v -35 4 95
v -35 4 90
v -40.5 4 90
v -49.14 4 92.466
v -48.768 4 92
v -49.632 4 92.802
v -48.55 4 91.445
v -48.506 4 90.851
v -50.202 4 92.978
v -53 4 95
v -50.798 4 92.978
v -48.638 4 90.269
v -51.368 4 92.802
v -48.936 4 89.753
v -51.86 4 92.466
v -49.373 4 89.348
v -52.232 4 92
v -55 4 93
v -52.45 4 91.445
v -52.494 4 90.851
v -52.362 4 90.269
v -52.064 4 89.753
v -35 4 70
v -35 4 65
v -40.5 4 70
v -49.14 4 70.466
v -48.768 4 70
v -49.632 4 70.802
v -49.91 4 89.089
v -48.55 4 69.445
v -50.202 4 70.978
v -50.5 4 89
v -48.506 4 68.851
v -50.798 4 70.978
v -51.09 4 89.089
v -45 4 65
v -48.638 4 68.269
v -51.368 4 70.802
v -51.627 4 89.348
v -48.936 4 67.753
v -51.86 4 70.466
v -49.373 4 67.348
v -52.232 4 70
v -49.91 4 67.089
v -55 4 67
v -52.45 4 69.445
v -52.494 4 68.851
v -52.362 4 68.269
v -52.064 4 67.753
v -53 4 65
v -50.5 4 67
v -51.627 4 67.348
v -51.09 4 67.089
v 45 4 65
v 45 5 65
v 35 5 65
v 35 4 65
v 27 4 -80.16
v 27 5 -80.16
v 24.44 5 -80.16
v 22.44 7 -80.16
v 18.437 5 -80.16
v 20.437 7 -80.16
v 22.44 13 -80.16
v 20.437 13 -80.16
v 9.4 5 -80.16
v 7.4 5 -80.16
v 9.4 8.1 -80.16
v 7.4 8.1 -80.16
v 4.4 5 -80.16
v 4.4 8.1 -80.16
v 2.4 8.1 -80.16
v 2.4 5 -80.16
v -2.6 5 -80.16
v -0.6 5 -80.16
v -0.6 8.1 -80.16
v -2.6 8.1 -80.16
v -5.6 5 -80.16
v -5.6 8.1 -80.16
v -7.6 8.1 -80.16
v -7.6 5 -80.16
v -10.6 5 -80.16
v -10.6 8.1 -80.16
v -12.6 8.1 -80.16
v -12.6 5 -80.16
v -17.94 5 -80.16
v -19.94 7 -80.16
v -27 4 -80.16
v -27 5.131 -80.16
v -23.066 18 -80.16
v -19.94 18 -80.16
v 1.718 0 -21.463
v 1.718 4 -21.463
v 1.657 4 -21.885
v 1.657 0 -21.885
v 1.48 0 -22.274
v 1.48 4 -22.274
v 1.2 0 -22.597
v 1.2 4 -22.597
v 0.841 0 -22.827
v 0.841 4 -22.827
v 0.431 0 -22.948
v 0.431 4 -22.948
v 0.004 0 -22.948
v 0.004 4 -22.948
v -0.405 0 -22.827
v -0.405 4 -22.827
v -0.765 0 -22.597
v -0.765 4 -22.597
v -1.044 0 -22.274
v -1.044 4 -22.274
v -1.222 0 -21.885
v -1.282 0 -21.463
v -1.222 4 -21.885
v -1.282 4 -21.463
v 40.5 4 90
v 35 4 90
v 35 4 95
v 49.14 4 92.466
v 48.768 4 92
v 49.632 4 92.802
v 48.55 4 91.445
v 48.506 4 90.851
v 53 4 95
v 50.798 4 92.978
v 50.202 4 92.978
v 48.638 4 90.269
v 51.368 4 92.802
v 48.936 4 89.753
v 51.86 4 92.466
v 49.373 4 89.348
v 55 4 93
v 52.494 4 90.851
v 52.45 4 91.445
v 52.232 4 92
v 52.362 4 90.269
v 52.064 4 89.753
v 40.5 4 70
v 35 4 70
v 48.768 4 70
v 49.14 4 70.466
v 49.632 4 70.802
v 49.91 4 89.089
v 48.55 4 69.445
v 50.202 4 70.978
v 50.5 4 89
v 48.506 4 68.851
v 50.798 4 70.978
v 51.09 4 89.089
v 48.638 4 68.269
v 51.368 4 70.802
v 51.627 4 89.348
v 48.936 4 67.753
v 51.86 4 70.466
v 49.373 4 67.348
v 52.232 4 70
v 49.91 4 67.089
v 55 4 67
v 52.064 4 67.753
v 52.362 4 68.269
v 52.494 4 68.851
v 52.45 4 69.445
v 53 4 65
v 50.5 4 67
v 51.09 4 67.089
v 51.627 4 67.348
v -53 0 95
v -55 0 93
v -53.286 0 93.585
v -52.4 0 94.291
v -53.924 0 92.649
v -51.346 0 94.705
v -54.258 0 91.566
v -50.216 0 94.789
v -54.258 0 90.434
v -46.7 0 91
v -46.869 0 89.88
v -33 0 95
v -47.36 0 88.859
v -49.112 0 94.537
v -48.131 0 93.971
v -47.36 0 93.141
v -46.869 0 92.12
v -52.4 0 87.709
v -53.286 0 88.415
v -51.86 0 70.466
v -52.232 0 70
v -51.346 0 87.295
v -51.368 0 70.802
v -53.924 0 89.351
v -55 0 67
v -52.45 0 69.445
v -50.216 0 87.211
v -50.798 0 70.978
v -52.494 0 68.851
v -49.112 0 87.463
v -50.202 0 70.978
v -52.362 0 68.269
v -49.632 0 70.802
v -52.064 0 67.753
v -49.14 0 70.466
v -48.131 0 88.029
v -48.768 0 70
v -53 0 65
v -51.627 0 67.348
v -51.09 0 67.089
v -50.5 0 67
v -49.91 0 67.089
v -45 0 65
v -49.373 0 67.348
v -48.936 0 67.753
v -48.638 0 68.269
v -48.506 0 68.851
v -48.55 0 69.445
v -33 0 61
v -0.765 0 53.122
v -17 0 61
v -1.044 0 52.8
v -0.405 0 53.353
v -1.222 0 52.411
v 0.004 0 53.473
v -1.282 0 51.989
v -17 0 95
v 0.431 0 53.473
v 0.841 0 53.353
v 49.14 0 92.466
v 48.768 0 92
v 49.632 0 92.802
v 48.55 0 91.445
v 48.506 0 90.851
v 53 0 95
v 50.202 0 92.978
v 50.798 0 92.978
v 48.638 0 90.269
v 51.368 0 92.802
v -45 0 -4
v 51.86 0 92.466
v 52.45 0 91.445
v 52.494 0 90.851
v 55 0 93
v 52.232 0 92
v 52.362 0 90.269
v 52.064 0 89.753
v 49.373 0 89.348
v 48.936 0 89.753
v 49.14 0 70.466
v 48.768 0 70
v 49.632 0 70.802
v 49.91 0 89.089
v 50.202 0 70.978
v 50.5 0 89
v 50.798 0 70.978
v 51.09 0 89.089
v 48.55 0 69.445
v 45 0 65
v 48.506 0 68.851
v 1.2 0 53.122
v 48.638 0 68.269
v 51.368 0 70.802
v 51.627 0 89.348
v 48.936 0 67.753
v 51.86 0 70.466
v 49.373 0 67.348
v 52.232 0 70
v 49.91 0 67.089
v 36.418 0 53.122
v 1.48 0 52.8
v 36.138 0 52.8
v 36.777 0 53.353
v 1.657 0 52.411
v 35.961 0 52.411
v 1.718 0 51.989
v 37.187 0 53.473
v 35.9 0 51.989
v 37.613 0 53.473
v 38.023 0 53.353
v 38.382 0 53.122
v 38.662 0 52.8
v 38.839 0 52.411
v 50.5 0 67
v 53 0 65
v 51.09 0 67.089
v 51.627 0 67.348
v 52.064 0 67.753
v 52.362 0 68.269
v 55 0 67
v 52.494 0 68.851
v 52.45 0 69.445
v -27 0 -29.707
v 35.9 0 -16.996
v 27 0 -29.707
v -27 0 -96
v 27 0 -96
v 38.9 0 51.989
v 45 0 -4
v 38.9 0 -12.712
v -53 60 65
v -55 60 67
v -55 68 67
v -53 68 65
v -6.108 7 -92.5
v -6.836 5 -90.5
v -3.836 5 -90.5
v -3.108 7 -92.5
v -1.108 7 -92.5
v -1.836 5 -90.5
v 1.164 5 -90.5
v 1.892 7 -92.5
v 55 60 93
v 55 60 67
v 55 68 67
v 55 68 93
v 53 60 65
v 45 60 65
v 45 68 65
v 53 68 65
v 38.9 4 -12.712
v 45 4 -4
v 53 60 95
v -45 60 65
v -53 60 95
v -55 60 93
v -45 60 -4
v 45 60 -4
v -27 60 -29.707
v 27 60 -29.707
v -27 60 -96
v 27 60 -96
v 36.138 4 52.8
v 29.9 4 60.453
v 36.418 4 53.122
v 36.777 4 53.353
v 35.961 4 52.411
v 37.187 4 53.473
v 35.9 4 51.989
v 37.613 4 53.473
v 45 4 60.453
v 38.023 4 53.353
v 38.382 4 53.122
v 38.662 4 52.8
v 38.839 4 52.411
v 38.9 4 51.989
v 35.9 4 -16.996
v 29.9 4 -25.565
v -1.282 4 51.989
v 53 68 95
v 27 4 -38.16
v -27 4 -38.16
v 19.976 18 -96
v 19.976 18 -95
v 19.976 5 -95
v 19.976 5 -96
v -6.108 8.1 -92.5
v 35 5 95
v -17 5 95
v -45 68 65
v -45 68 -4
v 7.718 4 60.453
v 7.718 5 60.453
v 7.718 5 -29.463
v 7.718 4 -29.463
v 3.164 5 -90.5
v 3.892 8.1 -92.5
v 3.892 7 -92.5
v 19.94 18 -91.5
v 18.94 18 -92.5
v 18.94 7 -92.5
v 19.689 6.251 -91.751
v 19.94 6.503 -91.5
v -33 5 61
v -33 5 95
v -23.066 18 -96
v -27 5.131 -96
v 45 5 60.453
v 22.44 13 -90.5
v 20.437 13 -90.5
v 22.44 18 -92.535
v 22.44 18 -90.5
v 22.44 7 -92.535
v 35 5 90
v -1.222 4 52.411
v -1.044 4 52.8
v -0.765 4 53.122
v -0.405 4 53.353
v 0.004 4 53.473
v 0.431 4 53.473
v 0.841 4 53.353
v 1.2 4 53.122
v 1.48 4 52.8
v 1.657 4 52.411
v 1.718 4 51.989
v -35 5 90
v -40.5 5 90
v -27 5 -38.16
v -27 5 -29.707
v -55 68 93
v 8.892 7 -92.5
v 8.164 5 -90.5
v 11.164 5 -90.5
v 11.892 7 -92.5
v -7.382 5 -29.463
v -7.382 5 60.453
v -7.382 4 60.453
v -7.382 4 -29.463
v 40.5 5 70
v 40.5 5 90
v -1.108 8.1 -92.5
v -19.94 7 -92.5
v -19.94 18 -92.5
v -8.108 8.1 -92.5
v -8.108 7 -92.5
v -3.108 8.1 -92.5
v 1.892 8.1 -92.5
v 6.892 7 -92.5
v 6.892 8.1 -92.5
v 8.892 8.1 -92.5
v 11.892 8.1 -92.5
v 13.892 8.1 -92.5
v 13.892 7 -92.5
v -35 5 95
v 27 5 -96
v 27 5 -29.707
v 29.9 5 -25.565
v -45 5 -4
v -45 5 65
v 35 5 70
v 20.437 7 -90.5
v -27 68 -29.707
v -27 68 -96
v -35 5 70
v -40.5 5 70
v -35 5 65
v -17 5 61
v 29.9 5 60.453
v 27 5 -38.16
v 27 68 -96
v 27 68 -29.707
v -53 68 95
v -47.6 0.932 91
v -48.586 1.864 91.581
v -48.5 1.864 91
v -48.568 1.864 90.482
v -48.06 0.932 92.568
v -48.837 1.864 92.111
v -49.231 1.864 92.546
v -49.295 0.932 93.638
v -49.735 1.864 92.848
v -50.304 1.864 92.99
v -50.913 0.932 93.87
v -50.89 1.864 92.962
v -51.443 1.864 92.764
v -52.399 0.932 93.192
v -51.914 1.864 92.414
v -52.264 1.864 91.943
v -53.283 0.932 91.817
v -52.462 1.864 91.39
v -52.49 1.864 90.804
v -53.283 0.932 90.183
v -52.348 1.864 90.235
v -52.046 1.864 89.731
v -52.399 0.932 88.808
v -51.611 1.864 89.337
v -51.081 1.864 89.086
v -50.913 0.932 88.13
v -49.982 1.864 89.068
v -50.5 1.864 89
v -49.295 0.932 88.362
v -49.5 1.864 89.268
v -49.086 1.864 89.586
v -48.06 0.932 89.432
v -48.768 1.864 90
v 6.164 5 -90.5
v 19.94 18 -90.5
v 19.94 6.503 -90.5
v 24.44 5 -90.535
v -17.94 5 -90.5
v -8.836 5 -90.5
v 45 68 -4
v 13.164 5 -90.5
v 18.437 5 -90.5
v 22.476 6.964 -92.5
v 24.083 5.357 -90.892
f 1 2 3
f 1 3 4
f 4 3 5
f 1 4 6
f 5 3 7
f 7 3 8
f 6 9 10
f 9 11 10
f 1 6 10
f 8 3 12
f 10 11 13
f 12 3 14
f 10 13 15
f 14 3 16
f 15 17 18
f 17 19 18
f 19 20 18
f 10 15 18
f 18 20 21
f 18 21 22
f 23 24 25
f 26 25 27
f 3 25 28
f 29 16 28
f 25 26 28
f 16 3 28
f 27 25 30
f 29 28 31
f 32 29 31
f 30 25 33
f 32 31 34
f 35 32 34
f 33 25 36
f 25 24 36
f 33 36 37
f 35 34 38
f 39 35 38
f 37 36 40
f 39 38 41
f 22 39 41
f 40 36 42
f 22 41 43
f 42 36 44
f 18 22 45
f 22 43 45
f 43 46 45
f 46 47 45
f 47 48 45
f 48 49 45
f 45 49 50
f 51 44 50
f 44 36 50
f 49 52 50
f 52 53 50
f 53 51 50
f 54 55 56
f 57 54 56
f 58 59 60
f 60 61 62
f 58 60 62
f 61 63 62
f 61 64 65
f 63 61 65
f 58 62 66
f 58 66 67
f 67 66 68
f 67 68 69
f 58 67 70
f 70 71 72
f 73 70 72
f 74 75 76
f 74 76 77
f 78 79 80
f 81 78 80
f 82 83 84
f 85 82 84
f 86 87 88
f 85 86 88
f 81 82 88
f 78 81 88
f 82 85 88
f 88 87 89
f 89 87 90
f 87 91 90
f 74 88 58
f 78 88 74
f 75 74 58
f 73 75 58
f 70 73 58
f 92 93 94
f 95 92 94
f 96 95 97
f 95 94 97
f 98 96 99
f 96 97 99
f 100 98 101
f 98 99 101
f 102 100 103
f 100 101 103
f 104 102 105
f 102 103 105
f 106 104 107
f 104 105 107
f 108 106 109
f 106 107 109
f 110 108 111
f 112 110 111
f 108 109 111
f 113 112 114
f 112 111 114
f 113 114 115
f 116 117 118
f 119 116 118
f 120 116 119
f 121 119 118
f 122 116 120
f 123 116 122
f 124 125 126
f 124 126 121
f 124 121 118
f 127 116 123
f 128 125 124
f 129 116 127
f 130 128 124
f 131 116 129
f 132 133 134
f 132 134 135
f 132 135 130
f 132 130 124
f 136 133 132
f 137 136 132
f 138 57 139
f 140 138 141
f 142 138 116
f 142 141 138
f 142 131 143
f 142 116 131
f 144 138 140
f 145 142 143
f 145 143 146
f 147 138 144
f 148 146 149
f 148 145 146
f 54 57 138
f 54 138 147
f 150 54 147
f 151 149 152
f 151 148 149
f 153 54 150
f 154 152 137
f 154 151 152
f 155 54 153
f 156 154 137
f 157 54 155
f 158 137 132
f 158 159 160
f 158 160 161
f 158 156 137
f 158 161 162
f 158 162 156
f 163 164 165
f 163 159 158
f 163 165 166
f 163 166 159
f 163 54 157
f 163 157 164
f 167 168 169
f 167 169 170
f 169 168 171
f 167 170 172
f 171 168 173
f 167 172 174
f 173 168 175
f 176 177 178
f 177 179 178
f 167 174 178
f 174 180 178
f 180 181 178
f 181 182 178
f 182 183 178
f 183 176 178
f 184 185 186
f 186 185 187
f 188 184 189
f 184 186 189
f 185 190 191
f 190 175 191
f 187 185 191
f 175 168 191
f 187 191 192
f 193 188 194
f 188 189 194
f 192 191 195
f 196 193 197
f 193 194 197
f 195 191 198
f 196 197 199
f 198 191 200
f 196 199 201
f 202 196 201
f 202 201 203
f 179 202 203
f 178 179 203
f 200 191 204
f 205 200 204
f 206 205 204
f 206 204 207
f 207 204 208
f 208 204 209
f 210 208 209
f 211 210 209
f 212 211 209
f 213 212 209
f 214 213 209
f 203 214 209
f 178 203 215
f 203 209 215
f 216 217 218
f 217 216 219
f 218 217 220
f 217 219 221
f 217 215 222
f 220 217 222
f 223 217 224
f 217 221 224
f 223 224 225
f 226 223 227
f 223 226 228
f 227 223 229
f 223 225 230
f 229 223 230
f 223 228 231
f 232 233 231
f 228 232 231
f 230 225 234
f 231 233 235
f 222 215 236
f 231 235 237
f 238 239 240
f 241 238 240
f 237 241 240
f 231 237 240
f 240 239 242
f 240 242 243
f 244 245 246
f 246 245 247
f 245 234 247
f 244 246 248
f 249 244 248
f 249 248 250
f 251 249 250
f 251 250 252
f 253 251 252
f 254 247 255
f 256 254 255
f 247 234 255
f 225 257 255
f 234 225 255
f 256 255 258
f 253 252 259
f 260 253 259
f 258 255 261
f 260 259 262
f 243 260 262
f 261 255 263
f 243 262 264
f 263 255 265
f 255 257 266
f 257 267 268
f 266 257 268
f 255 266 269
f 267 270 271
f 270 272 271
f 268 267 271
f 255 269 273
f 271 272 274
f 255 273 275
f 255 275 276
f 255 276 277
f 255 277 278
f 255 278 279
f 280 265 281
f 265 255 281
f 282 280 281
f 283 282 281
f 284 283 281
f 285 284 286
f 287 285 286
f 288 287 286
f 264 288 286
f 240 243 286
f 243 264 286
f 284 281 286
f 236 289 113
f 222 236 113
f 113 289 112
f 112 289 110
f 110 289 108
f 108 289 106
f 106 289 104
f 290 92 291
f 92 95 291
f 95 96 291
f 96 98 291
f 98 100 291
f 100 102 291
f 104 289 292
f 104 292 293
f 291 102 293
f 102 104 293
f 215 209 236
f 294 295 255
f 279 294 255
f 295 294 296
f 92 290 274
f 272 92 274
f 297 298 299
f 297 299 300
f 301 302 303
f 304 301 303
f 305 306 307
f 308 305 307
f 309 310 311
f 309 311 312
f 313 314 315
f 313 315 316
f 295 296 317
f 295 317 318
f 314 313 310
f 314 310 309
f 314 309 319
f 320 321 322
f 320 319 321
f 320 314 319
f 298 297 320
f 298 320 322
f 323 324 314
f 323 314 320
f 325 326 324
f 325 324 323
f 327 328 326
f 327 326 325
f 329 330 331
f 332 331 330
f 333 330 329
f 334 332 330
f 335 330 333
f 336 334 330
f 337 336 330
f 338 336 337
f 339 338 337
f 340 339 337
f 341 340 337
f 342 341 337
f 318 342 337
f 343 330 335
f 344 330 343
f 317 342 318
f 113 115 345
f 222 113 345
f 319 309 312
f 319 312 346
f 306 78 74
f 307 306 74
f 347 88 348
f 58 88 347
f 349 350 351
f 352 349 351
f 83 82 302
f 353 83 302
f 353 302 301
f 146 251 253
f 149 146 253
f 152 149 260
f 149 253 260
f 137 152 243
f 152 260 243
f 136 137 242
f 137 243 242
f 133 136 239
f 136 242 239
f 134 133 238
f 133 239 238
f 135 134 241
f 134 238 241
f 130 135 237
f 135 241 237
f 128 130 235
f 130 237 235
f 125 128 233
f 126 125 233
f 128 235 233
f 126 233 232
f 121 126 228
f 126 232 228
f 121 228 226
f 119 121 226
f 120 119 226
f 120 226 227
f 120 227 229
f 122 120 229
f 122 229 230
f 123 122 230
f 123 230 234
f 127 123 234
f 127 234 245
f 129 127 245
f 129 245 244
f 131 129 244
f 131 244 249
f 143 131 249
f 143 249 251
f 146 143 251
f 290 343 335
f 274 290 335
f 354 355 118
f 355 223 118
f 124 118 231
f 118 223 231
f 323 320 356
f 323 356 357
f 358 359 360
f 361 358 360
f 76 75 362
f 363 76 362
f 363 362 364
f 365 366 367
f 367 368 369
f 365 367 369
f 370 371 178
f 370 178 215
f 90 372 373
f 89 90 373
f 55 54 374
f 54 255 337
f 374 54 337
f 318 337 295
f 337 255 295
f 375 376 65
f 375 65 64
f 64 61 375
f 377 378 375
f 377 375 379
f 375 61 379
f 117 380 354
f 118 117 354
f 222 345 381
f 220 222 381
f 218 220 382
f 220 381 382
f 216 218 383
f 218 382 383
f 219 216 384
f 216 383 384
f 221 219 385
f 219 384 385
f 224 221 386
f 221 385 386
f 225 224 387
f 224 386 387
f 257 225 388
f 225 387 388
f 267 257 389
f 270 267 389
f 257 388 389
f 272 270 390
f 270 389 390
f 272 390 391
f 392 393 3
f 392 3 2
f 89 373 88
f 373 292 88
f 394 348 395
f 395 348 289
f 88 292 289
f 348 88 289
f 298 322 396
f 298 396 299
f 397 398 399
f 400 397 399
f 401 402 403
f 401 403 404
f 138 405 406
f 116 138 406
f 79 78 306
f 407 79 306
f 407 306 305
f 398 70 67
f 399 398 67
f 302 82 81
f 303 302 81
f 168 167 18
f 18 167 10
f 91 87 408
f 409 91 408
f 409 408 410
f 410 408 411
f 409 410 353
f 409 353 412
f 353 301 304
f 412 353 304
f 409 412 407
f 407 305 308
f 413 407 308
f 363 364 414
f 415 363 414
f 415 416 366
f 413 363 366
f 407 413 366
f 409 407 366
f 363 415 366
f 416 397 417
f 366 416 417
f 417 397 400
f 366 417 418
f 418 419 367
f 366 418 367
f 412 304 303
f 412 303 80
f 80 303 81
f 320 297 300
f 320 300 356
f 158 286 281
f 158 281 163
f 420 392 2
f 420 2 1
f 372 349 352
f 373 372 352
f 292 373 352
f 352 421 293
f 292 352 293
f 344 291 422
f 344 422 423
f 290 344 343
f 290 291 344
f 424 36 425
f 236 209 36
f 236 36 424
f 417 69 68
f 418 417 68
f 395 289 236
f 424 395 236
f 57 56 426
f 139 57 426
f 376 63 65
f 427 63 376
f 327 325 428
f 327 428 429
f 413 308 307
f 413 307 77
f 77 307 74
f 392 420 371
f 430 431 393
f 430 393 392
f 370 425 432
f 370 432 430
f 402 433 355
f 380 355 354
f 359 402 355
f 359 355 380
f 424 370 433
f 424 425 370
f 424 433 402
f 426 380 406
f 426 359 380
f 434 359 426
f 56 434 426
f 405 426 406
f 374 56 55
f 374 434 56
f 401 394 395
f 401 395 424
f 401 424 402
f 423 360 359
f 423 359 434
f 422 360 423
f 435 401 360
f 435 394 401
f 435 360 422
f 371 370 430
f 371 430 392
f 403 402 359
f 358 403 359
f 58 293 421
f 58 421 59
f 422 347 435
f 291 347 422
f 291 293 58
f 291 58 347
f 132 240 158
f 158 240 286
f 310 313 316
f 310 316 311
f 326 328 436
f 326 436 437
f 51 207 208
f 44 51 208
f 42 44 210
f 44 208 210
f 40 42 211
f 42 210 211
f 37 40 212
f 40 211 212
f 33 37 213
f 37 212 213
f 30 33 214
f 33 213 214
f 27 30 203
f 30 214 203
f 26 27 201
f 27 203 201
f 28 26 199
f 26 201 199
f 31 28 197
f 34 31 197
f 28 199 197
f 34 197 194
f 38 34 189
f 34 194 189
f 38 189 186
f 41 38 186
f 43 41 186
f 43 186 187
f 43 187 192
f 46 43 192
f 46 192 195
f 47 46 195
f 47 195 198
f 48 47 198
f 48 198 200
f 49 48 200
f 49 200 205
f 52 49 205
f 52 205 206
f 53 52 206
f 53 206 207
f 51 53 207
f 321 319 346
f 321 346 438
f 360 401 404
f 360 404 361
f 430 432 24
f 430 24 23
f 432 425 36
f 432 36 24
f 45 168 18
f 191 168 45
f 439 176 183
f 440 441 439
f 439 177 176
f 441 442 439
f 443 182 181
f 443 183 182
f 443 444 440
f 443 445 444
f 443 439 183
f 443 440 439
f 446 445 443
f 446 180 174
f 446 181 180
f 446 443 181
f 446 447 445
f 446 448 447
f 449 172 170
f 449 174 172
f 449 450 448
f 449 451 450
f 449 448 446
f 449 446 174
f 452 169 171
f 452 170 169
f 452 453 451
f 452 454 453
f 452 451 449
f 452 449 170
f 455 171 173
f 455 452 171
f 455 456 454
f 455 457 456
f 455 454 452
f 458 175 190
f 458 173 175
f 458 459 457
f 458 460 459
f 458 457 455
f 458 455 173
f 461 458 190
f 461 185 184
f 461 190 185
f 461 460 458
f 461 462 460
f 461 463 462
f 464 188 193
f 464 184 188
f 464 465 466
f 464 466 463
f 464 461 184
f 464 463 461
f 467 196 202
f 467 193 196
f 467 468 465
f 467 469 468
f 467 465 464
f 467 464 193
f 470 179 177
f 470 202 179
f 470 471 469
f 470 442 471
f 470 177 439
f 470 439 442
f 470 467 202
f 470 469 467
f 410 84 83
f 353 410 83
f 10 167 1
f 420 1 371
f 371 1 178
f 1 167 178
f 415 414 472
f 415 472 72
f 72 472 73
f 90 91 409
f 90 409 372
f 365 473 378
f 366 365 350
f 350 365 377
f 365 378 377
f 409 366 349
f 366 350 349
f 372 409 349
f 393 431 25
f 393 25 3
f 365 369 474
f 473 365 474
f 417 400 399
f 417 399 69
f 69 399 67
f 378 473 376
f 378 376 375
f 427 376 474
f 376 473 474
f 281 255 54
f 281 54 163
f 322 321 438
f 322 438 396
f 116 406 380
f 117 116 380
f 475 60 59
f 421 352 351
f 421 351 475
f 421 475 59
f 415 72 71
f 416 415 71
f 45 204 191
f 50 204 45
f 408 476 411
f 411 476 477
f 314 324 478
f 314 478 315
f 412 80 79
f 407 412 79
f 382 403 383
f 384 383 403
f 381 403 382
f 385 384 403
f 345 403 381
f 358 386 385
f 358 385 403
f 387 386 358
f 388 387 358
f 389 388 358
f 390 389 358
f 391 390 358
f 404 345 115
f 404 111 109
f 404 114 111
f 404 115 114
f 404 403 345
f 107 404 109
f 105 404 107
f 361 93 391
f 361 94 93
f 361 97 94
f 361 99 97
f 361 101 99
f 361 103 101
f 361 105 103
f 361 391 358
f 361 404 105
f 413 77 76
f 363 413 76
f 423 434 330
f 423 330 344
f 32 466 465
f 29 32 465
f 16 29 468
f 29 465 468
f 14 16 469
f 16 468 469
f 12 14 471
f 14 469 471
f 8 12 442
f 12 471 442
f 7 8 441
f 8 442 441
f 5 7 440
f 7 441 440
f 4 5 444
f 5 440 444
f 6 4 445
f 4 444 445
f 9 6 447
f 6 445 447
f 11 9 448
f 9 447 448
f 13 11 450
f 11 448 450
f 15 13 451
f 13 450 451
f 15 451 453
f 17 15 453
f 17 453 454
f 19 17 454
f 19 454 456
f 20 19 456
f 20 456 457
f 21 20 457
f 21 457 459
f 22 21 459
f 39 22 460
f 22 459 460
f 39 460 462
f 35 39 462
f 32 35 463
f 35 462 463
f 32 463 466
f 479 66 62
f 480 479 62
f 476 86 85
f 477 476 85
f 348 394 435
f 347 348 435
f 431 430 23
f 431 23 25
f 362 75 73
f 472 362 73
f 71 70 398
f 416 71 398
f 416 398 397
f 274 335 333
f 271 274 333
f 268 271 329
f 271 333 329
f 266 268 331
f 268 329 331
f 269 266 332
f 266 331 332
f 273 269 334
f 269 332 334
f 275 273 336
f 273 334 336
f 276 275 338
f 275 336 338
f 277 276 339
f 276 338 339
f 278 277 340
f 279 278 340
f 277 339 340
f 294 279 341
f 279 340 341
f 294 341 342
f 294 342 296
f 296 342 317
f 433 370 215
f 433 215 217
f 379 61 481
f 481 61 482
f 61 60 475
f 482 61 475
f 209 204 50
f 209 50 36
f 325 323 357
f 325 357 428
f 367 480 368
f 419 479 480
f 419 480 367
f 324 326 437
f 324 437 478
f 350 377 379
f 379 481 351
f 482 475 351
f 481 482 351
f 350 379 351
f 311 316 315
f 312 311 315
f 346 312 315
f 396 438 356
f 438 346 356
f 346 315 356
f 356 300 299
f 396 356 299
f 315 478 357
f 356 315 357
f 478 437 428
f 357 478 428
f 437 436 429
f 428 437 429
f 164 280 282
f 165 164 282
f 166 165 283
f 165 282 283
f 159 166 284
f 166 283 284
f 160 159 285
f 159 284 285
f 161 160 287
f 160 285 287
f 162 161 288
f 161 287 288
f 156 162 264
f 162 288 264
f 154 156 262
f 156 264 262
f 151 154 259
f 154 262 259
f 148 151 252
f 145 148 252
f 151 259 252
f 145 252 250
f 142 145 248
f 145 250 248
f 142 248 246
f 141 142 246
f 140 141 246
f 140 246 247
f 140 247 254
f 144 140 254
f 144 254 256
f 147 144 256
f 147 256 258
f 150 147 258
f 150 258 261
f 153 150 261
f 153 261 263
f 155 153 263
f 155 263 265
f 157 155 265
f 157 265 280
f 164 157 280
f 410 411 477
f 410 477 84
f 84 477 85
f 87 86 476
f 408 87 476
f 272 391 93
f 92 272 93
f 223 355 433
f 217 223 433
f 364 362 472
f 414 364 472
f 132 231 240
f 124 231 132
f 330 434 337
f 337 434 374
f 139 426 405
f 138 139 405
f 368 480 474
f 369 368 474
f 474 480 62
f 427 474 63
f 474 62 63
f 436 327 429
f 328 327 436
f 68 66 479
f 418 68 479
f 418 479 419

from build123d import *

# Parameters (mm, degrees)
SKETCH1_W                     = 90
SKETCH1_H                     = 190
BOSS_EXTRUDE1_DEPTH           = 5
SKETCH2_W                     = 10
SKETCH2_H                     = 30
BOSS_EXTRUDE2_DEPTH           = 5
CHAMFER1_SIZE                 = 2
SKETCH3_W                     = 16
SKETCH3_H                     = 34
CUT_EXTRUDE1_DEPTH            = 50
SKETCH4_W                     = 90
SKETCH4_H                     = 42
CUT_EXTRUDE2_DEPTH            = 1
SKETCH7_W                     = 15.1
SKETCH7_H                     = 89.916335477
CUT_EXTRUDE7_DEPTH            = 1
BOSS_EXTRUDE4_START           = 5
BOSS_EXTRUDE4_DEPTH           = 13
BOSS_EXTRUDE5_DEPTH           = 3.1
CUT_EXTRUDE11_START           = 5
CUT_EXTRUDE11_DEPTH           = 1
CUT_EXTRUDE12_DEPTH           = 112.23848255
CUT_EXTRUDE12_DEPTH_BACK      = 112.23848255
BOSS_EXTRUDE6_DEPTH           = 1
CHAMFER4_SIZE                 = 2
CUT_EXTRUDE13_REACH           = 114.094
SKETCH23_R                    = 2
CUT_EXTRUDE14_DEPTH           = 113.093556715
CUT_EXTRUDE14_DEPTH_BACK      = 113.093556715
SKETCH26_R                    = 3.8
CUT_EXTRUDE15_DEPTH           = 2.5
CUT_EXTRUDE15_TAPER           = 44
CUT_EXTRUDE15_OTHER_WAY_DEPTH = 113.093556715
SKETCH27_W                    = 2.002698481
SKETCH27_H                    = 10.340179912
BOSS_EXTRUDE7_DEPTH           = 8
CHAMFER5_SIZE                 = 2
CHAMFER6_SIZE                 = 15.045922045
CHAMFER6_SIZE_2               = 4.6
CHAMFER7_SIZE                 = 2
BOSS_EXTRUDE8_START           = 60
BOSS_EXTRUDE8_DEPTH           = 8


with BuildPart() as part:
    # Sketch1 → Boss-Extrude1 (new body)
    with BuildSketch(Plane(origin=(0, 0, 0), x_dir=(1, 0, 0), z_dir=(0, 1, 0))):
        Rectangle(SKETCH1_W, SKETCH1_H)
    extrude(amount=BOSS_EXTRUDE1_DEPTH)

    # Sketch2 → Boss-Extrude2 (add)
    with BuildSketch(Plane(origin=(0, 0, 0), x_dir=(1, 0, 0), z_dir=(0, 1, 0))):
        with Locations((-50, -80)):
            Rectangle(SKETCH2_W, SKETCH2_H)
        with Locations((50, -80)):
            Rectangle(SKETCH2_W, SKETCH2_H)
    extrude(amount=BOSS_EXTRUDE2_DEPTH)

    # Chamfer1
    chamfer1_edges = [part.edges().sort_by_distance(p)[0] for p in [
        (-55, 2.5, 65),
        (-55, 2.5, 95),
        (55, 2.5, 95),
        (55, 2.5, 65),
    ]]
    chamfer(chamfer1_edges, length=CHAMFER1_SIZE)

    # Sketch3 → Cut-Extrude1 (cut)
    with BuildSketch(Plane(origin=(0, 5, 0), x_dir=(1, 0, 0), z_dir=(0, 1, 0))):
        with Locations((-25, -78)):
            Rectangle(SKETCH3_W, SKETCH3_H)
    extrude(amount=-CUT_EXTRUDE1_DEPTH, mode=Mode.SUBTRACT)

    # Sketch4 → Cut-Extrude2 (cut)
    with BuildSketch(Plane(origin=(0, 5, 0), x_dir=(1, 0, 0), z_dir=(0, 1, 0))):
        with Locations((0, 59.159820088)):
            Rectangle(SKETCH4_W, SKETCH4_H)
    extrude(amount=-CUT_EXTRUDE2_DEPTH, mode=Mode.SUBTRACT)

    # Sketch7 → Cut-Extrude7 (cut)
    with BuildSketch(Plane(origin=(0, 5, 0), x_dir=(1, 0, 0), z_dir=(0, 1, 0))):
        with Locations((37.45, -15.495273531)):
            Rectangle(SKETCH7_W, SKETCH7_H)
        with Locations((0.16773297, -15.495273531)):
            Rectangle(SKETCH7_W, SKETCH7_H)
    extrude(amount=-CUT_EXTRUDE7_DEPTH, mode=Mode.SUBTRACT)

    # Sketch17 → Boss-Extrude4 (add)
    with BuildSketch(Plane(origin=(0, 0, 0), x_dir=(1, 0, 0), z_dir=(0, 1, 0)).offset(BOSS_EXTRUDE4_START)):
        Polygon((-22.440023983, 80.159820088), (-19.940023983, 80.159820088), (-19.940023983, 92.499820088), (18.940023983, 92.499820088), (19.940023983, 91.499820088), (19.940023983, 90.5), (22.440023983, 90.5), (22.440023983, 92.535353994), (19.975557889, 94.999820088), (-22.440023983, 94.999820088), align=None)
    extrude(amount=BOSS_EXTRUDE4_DEPTH)

    # Sketch18 → Boss-Extrude5 (add)
    with BuildSketch(Plane(origin=(0, 5, 0), x_dir=(1, 0, 0), z_dir=(0, 1, 0))):
        Polygon((-12.599634528, 80.159820088), (-10.599634528, 80.159820088), (-6.108241837, 92.499820088), (-8.108241837, 92.499820088), align=None)
        Polygon((-3.108241837, 92.499820088), (-7.599634528, 80.159820088), (-5.599634528, 80.159820088), (-1.108241837, 92.499820088), align=None)
        Polygon((1.891758163, 92.499820088), (-2.599634528, 80.159820088), (-0.599634528, 80.159820088), (3.891758163, 92.499820088), align=None)
        Polygon((6.891758163, 92.499820088), (2.400365472, 80.159820088), (4.400365472, 80.159820088), (8.891758163, 92.499820088), align=None)
        Polygon((11.891758163, 92.499820088), (7.400365472, 80.159820088), (9.400365472, 80.159820088), (13.891758163, 92.499820088), align=None)
    extrude(amount=BOSS_EXTRUDE5_DEPTH)

    # Sketch19 → Cut-Extrude11 (cut)
    with BuildSketch(Plane(origin=(0, 0, 0), x_dir=(1, 0, 0), z_dir=(0, 1, 0)).offset(CUT_EXTRUDE11_START)):
        Polygon((-35, -65), (-35, -70), (-40.5, -70), (-40.5, -90), (-35, -90), (-35, -95), (-53, -95), (-55, -93), (-55, -67), (-53, -65), align=None)
    cut_extrude11 = extrude(amount=-CUT_EXTRUDE11_DEPTH, mode=Mode.SUBTRACT)

    # Mirror1: Cut-Extrude11 across plane
    add(cut_extrude11.mirror(Plane(origin=(0, 0, 0), x_dir=(0, 0, 1), z_dir=(1, 0, 0))), mode=Mode.SUBTRACT)

    # Sketch20 → Cut-Extrude12 (cut, two sides: drawn at the far end of the back side and taken through both)
    with BuildSketch(Plane(origin=(0, 0, 0), x_dir=(1, 0, 0), z_dir=(0, 1, 0)).offset(-CUT_EXTRUDE12_DEPTH_BACK)):
        Polygon((-27, 29.706664121), (-45, 4), (-45, 95), (-27, 95), align=None)
        Polygon((27, 95), (27, 29.706664121), (45, 4), (45, 95), align=None)
    extrude(amount=CUT_EXTRUDE12_DEPTH + CUT_EXTRUDE12_DEPTH_BACK, mode=Mode.SUBTRACT)

    # Sketch22 → Boss-Extrude6 (add)
    with BuildSketch(Plane(origin=(0, 0, -94.999820088), x_dir=(-1, 0, 0), z_dir=(0, 0, -1))):
        Polygon((-19.975557889, 5), (-27, 5), (-27, 0), (27, 0), (27, 5), (22.440023983, 5), (22.440023983, 18), (-19.975557889, 18), align=None)
    extrude(amount=BOSS_EXTRUDE6_DEPTH)

    # Chamfer4
    chamfer4_edges = [part.edges().sort_by_distance(p)[0] for p in [
        (-19.940023983, 5, -86.329820088),
        (-14.02413291, 5, -92.499820088),
        (-4.608241837, 5, -92.499820088),
        (0.391758163, 5, -92.499820088),
        (5.391758163, 5, -92.499820088),
        (10.391758163, 5, -92.499820088),
    ]]
    chamfer(chamfer4_edges, length=CHAMFER4_SIZE)

    # Sketch23 → Cut-Extrude13 (cut, up to next)
    with BuildSketch(Plane.XZ, mode=Mode.PRIVATE) as cut_extrude13_sk1:
        with Locations(Location((-50.5, 91, 0), (0, 0, 270))):
            Circle(SKETCH23_R)
    cut_extrude13_tool1 = extrude(cut_extrude13_sk1.sketch, amount=-CUT_EXTRUDE13_REACH, mode=Mode.PRIVATE) & part.part
    # Sketch23 → Cut-Extrude13 (cut, up to next)
    with BuildSketch(Plane.XZ, mode=Mode.PRIVATE) as cut_extrude13_sk2:
        with Locations(Location((-50.5, 69, 0), (0, 0, 270))):
            Circle(SKETCH23_R)
    cut_extrude13_tool2 = extrude(cut_extrude13_sk2.sketch, amount=-CUT_EXTRUDE13_REACH, mode=Mode.PRIVATE) & part.part
    # Sketch23 → Cut-Extrude13 (cut, up to next)
    with BuildSketch(Plane.XZ, mode=Mode.PRIVATE) as cut_extrude13_sk3:
        with Locations(Location((50.5, 69, 0), (0, 0, 270))):
            Circle(SKETCH23_R)
    cut_extrude13_tool3 = extrude(cut_extrude13_sk3.sketch, amount=-CUT_EXTRUDE13_REACH, mode=Mode.PRIVATE) & part.part
    # Sketch23 → Cut-Extrude13 (cut, up to next)
    with BuildSketch(Plane.XZ, mode=Mode.PRIVATE) as cut_extrude13_sk4:
        with Locations(Location((50.5, 91, 0), (0, 0, 270))):
            Circle(SKETCH23_R)
    cut_extrude13_tool4 = extrude(cut_extrude13_sk4.sketch, amount=-CUT_EXTRUDE13_REACH, mode=Mode.PRIVATE) & part.part
    add(cut_extrude13_tool1.solids().sort_by_distance((-50.5, 0, 91))[0], mode=Mode.SUBTRACT)
    add(cut_extrude13_tool2.solids().sort_by_distance((-50.5, 0, 69))[0], mode=Mode.SUBTRACT)
    add(cut_extrude13_tool3.solids().sort_by_distance((50.5, 0, 69))[0], mode=Mode.SUBTRACT)
    add(cut_extrude13_tool4.solids().sort_by_distance((50.5, 0, 91))[0], mode=Mode.SUBTRACT)

    # Sketch25 → Cut-Extrude14 (cut, two sides: drawn at the far end of the back side and taken through both)
    with BuildSketch(Plane.XZ.offset(-CUT_EXTRUDE14_DEPTH_BACK)):
        with BuildLine():
            Line((1.71773297, 51.988728589), (1.71773297, -21.462894208))
            ThreePointArc((1.71773297, -21.462894208), (0.21773297, -22.962894208), (-1.28226703, -21.462894208))
            Line((-1.28226703, -21.462894208), (-1.28226703, 51.988728589))
            ThreePointArc((-1.28226703, 51.988728589), (0.21773297, 53.488728589), (1.71773297, 51.988728589))
        make_face()
        with BuildLine():
            Line((38.9, 51.988728589), (38.9, -21.462894208))
            ThreePointArc((38.9, -21.462894208), (37.4, -22.962894208), (35.9, -21.462894208))
            Line((35.9, -21.462894208), (35.9, 51.988728589))
            ThreePointArc((35.9, 51.988728589), (37.4, 53.488728589), (38.9, 51.988728589))
        make_face()
    extrude(amount=CUT_EXTRUDE14_DEPTH + CUT_EXTRUDE14_DEPTH_BACK, mode=Mode.SUBTRACT)

    # Sketch26 → Cut-Extrude15 (cut)
    with BuildSketch(Plane.XZ):
        with Locations((-50.5, 91)):
            Circle(SKETCH26_R)
    extrude(amount=-CUT_EXTRUDE15_DEPTH, taper=CUT_EXTRUDE15_TAPER, mode=Mode.SUBTRACT)

    # Sketch26 → Cut-Extrude15 other way (cut)
    with BuildSketch(Plane.XZ):
        with Locations((-50.5, 91)):
            Circle(SKETCH26_R)
    extrude(amount=CUT_EXTRUDE15_OTHER_WAY_DEPTH, mode=Mode.SUBTRACT)

    # Sketch27 → Boss-Extrude7 (add)
    with BuildSketch(Plane(origin=(0, 5, 0), x_dir=(1, 0, 0), z_dir=(0, 1, 0))):
        with Locations((21.438674742, 85.329910044)):
            Rectangle(SKETCH27_W, SKETCH27_H)
    extrude(amount=BOSS_EXTRUDE7_DEPTH)

    # Chamfer5
    chamfer5_edges = [part.edges().sort_by_distance(p)[0] for p in [
        (22.440023983, 5, -86.347587041),
    ]]
    chamfer(chamfer5_edges, length=CHAMFER5_SIZE)

    # Chamfer6
    # the kernel refuses this chamfer: 15.045922045, 4.6 mm, written as the material it adds along each edge
    with BuildSketch(Plane(origin=(-22.440023983, 5, -80.159820088), x_dir=(0.011263281176818154, 0.9999365672367082, 0), z_dir=(0, 0, -1))) as chamfer6_piece_1_section:
        Polygon((CHAMFER6_SIZE * 0.999936567239, -CHAMFER6_SIZE * 0.0112632811768), (-CHAMFER6_SIZE_2 * 0.0112632811768, -CHAMFER6_SIZE_2 * 0.999936567237), (0, 0), align=None)
    chamfer6_piece_1 = extrude(amount=15.84, mode=Mode.PRIVATE)
    chamfer6_piece_1 = split(chamfer6_piece_1, bisect_by=Plane(origin=(-23.998082586, 18, -88.079820088), z_dir=(0, -1, 0)), keep=Keep.TOP, mode=Mode.PRIVATE)
    chamfer6_piece_1 = split(chamfer6_piece_1, bisect_by=Plane(origin=(-27, 9.852411417, -88.079820088), z_dir=(1, 0, 0)), keep=Keep.TOP, mode=Mode.PRIVATE)
    add(chamfer6_piece_1)

    # Chamfer7
    # the kernel refuses this chamfer: 2 mm, written as the material it adds along each edge
    with BuildSketch(Plane(origin=(8.748392187, 5, -92.499820088), x_dir=(-2.155664593802373e-14, -0.027495876610586414, 0.9996219169112968), z_dir=(1, 0, 0))) as chamfer7_piece_1_section:
        Polygon((CHAMFER7_SIZE * 0.999621916911, -CHAMFER7_SIZE * 0.0274958766106), (-CHAMFER7_SIZE * 0.0274958766106, -CHAMFER7_SIZE * 0.999621916911), (0, 0), align=None)
    chamfer7_piece_1 = extrude(amount=15.334997772, mode=Mode.PRIVATE)
    chamfer7_piece_1 = split(chamfer7_piece_1, bisect_by=Plane(origin=(20.49595334, 8.944070643, -90.499940029), z_dir=(-0.7071067811865476, -0.7071067811865476, -1.2691553730131522e-15)), keep=Keep.TOP, mode=Mode.PRIVATE)
    chamfer7_piece_1 = split(chamfer7_piece_1, bisect_by=Plane(origin=(20.513690307, 5.000059971, -94.46168767), z_dir=(-0.7071067811865465, 0, 0.7071067811865486)), keep=Keep.TOP, mode=Mode.PRIVATE)
    add(chamfer7_piece_1)
    with BuildSketch(Plane(origin=(20.437325502, 5, -80.159820088), x_dir=(-0.9996219169112968, -0.02749587661058651, 0), z_dir=(0, 0, -1))) as chamfer7_piece_2_section:
        Polygon((CHAMFER7_SIZE * 0.999621916911, CHAMFER7_SIZE * 0.0274958766106), (-CHAMFER7_SIZE * 0.0274958766106, CHAMFER7_SIZE * 0.999621916911), (0, 0), align=None)
    chamfer7_piece_2 = extrude(amount=15.483545888, mode=Mode.PRIVATE)
    chamfer7_piece_2 = split(chamfer7_piece_2, bisect_by=Plane(origin=(24.542296211, 5.500899494, -90.433081766), z_dir=(-0.7071067811865465, 0, 0.7071067811865486)), keep=Keep.TOP, mode=Mode.PRIVATE)
    add(chamfer7_piece_2)


with BuildPart() as body_2:
    # Sketch28 → Boss-Extrude8 (new body)
    with BuildSketch(Plane(origin=(0, 0, 0), x_dir=(1, 0, 0), z_dir=(0, 1, 0)).offset(BOSS_EXTRUDE8_START)):
        Polygon((-53, -95), (-55, -93), (-55, -67), (-53, -65), (-45, -65), (-45, 4), (-27, 29.706664121), (-27, 95.999820088), (27, 95.999820088), (27, 29.706664121), (45, 4), (45, -65), (53, -65), (55, -67), (55, -93), (53, -95), align=None)
    extrude(amount=BOSS_EXTRUDE8_DEPTH)


solid = Compound([part.part, body_2.part])
